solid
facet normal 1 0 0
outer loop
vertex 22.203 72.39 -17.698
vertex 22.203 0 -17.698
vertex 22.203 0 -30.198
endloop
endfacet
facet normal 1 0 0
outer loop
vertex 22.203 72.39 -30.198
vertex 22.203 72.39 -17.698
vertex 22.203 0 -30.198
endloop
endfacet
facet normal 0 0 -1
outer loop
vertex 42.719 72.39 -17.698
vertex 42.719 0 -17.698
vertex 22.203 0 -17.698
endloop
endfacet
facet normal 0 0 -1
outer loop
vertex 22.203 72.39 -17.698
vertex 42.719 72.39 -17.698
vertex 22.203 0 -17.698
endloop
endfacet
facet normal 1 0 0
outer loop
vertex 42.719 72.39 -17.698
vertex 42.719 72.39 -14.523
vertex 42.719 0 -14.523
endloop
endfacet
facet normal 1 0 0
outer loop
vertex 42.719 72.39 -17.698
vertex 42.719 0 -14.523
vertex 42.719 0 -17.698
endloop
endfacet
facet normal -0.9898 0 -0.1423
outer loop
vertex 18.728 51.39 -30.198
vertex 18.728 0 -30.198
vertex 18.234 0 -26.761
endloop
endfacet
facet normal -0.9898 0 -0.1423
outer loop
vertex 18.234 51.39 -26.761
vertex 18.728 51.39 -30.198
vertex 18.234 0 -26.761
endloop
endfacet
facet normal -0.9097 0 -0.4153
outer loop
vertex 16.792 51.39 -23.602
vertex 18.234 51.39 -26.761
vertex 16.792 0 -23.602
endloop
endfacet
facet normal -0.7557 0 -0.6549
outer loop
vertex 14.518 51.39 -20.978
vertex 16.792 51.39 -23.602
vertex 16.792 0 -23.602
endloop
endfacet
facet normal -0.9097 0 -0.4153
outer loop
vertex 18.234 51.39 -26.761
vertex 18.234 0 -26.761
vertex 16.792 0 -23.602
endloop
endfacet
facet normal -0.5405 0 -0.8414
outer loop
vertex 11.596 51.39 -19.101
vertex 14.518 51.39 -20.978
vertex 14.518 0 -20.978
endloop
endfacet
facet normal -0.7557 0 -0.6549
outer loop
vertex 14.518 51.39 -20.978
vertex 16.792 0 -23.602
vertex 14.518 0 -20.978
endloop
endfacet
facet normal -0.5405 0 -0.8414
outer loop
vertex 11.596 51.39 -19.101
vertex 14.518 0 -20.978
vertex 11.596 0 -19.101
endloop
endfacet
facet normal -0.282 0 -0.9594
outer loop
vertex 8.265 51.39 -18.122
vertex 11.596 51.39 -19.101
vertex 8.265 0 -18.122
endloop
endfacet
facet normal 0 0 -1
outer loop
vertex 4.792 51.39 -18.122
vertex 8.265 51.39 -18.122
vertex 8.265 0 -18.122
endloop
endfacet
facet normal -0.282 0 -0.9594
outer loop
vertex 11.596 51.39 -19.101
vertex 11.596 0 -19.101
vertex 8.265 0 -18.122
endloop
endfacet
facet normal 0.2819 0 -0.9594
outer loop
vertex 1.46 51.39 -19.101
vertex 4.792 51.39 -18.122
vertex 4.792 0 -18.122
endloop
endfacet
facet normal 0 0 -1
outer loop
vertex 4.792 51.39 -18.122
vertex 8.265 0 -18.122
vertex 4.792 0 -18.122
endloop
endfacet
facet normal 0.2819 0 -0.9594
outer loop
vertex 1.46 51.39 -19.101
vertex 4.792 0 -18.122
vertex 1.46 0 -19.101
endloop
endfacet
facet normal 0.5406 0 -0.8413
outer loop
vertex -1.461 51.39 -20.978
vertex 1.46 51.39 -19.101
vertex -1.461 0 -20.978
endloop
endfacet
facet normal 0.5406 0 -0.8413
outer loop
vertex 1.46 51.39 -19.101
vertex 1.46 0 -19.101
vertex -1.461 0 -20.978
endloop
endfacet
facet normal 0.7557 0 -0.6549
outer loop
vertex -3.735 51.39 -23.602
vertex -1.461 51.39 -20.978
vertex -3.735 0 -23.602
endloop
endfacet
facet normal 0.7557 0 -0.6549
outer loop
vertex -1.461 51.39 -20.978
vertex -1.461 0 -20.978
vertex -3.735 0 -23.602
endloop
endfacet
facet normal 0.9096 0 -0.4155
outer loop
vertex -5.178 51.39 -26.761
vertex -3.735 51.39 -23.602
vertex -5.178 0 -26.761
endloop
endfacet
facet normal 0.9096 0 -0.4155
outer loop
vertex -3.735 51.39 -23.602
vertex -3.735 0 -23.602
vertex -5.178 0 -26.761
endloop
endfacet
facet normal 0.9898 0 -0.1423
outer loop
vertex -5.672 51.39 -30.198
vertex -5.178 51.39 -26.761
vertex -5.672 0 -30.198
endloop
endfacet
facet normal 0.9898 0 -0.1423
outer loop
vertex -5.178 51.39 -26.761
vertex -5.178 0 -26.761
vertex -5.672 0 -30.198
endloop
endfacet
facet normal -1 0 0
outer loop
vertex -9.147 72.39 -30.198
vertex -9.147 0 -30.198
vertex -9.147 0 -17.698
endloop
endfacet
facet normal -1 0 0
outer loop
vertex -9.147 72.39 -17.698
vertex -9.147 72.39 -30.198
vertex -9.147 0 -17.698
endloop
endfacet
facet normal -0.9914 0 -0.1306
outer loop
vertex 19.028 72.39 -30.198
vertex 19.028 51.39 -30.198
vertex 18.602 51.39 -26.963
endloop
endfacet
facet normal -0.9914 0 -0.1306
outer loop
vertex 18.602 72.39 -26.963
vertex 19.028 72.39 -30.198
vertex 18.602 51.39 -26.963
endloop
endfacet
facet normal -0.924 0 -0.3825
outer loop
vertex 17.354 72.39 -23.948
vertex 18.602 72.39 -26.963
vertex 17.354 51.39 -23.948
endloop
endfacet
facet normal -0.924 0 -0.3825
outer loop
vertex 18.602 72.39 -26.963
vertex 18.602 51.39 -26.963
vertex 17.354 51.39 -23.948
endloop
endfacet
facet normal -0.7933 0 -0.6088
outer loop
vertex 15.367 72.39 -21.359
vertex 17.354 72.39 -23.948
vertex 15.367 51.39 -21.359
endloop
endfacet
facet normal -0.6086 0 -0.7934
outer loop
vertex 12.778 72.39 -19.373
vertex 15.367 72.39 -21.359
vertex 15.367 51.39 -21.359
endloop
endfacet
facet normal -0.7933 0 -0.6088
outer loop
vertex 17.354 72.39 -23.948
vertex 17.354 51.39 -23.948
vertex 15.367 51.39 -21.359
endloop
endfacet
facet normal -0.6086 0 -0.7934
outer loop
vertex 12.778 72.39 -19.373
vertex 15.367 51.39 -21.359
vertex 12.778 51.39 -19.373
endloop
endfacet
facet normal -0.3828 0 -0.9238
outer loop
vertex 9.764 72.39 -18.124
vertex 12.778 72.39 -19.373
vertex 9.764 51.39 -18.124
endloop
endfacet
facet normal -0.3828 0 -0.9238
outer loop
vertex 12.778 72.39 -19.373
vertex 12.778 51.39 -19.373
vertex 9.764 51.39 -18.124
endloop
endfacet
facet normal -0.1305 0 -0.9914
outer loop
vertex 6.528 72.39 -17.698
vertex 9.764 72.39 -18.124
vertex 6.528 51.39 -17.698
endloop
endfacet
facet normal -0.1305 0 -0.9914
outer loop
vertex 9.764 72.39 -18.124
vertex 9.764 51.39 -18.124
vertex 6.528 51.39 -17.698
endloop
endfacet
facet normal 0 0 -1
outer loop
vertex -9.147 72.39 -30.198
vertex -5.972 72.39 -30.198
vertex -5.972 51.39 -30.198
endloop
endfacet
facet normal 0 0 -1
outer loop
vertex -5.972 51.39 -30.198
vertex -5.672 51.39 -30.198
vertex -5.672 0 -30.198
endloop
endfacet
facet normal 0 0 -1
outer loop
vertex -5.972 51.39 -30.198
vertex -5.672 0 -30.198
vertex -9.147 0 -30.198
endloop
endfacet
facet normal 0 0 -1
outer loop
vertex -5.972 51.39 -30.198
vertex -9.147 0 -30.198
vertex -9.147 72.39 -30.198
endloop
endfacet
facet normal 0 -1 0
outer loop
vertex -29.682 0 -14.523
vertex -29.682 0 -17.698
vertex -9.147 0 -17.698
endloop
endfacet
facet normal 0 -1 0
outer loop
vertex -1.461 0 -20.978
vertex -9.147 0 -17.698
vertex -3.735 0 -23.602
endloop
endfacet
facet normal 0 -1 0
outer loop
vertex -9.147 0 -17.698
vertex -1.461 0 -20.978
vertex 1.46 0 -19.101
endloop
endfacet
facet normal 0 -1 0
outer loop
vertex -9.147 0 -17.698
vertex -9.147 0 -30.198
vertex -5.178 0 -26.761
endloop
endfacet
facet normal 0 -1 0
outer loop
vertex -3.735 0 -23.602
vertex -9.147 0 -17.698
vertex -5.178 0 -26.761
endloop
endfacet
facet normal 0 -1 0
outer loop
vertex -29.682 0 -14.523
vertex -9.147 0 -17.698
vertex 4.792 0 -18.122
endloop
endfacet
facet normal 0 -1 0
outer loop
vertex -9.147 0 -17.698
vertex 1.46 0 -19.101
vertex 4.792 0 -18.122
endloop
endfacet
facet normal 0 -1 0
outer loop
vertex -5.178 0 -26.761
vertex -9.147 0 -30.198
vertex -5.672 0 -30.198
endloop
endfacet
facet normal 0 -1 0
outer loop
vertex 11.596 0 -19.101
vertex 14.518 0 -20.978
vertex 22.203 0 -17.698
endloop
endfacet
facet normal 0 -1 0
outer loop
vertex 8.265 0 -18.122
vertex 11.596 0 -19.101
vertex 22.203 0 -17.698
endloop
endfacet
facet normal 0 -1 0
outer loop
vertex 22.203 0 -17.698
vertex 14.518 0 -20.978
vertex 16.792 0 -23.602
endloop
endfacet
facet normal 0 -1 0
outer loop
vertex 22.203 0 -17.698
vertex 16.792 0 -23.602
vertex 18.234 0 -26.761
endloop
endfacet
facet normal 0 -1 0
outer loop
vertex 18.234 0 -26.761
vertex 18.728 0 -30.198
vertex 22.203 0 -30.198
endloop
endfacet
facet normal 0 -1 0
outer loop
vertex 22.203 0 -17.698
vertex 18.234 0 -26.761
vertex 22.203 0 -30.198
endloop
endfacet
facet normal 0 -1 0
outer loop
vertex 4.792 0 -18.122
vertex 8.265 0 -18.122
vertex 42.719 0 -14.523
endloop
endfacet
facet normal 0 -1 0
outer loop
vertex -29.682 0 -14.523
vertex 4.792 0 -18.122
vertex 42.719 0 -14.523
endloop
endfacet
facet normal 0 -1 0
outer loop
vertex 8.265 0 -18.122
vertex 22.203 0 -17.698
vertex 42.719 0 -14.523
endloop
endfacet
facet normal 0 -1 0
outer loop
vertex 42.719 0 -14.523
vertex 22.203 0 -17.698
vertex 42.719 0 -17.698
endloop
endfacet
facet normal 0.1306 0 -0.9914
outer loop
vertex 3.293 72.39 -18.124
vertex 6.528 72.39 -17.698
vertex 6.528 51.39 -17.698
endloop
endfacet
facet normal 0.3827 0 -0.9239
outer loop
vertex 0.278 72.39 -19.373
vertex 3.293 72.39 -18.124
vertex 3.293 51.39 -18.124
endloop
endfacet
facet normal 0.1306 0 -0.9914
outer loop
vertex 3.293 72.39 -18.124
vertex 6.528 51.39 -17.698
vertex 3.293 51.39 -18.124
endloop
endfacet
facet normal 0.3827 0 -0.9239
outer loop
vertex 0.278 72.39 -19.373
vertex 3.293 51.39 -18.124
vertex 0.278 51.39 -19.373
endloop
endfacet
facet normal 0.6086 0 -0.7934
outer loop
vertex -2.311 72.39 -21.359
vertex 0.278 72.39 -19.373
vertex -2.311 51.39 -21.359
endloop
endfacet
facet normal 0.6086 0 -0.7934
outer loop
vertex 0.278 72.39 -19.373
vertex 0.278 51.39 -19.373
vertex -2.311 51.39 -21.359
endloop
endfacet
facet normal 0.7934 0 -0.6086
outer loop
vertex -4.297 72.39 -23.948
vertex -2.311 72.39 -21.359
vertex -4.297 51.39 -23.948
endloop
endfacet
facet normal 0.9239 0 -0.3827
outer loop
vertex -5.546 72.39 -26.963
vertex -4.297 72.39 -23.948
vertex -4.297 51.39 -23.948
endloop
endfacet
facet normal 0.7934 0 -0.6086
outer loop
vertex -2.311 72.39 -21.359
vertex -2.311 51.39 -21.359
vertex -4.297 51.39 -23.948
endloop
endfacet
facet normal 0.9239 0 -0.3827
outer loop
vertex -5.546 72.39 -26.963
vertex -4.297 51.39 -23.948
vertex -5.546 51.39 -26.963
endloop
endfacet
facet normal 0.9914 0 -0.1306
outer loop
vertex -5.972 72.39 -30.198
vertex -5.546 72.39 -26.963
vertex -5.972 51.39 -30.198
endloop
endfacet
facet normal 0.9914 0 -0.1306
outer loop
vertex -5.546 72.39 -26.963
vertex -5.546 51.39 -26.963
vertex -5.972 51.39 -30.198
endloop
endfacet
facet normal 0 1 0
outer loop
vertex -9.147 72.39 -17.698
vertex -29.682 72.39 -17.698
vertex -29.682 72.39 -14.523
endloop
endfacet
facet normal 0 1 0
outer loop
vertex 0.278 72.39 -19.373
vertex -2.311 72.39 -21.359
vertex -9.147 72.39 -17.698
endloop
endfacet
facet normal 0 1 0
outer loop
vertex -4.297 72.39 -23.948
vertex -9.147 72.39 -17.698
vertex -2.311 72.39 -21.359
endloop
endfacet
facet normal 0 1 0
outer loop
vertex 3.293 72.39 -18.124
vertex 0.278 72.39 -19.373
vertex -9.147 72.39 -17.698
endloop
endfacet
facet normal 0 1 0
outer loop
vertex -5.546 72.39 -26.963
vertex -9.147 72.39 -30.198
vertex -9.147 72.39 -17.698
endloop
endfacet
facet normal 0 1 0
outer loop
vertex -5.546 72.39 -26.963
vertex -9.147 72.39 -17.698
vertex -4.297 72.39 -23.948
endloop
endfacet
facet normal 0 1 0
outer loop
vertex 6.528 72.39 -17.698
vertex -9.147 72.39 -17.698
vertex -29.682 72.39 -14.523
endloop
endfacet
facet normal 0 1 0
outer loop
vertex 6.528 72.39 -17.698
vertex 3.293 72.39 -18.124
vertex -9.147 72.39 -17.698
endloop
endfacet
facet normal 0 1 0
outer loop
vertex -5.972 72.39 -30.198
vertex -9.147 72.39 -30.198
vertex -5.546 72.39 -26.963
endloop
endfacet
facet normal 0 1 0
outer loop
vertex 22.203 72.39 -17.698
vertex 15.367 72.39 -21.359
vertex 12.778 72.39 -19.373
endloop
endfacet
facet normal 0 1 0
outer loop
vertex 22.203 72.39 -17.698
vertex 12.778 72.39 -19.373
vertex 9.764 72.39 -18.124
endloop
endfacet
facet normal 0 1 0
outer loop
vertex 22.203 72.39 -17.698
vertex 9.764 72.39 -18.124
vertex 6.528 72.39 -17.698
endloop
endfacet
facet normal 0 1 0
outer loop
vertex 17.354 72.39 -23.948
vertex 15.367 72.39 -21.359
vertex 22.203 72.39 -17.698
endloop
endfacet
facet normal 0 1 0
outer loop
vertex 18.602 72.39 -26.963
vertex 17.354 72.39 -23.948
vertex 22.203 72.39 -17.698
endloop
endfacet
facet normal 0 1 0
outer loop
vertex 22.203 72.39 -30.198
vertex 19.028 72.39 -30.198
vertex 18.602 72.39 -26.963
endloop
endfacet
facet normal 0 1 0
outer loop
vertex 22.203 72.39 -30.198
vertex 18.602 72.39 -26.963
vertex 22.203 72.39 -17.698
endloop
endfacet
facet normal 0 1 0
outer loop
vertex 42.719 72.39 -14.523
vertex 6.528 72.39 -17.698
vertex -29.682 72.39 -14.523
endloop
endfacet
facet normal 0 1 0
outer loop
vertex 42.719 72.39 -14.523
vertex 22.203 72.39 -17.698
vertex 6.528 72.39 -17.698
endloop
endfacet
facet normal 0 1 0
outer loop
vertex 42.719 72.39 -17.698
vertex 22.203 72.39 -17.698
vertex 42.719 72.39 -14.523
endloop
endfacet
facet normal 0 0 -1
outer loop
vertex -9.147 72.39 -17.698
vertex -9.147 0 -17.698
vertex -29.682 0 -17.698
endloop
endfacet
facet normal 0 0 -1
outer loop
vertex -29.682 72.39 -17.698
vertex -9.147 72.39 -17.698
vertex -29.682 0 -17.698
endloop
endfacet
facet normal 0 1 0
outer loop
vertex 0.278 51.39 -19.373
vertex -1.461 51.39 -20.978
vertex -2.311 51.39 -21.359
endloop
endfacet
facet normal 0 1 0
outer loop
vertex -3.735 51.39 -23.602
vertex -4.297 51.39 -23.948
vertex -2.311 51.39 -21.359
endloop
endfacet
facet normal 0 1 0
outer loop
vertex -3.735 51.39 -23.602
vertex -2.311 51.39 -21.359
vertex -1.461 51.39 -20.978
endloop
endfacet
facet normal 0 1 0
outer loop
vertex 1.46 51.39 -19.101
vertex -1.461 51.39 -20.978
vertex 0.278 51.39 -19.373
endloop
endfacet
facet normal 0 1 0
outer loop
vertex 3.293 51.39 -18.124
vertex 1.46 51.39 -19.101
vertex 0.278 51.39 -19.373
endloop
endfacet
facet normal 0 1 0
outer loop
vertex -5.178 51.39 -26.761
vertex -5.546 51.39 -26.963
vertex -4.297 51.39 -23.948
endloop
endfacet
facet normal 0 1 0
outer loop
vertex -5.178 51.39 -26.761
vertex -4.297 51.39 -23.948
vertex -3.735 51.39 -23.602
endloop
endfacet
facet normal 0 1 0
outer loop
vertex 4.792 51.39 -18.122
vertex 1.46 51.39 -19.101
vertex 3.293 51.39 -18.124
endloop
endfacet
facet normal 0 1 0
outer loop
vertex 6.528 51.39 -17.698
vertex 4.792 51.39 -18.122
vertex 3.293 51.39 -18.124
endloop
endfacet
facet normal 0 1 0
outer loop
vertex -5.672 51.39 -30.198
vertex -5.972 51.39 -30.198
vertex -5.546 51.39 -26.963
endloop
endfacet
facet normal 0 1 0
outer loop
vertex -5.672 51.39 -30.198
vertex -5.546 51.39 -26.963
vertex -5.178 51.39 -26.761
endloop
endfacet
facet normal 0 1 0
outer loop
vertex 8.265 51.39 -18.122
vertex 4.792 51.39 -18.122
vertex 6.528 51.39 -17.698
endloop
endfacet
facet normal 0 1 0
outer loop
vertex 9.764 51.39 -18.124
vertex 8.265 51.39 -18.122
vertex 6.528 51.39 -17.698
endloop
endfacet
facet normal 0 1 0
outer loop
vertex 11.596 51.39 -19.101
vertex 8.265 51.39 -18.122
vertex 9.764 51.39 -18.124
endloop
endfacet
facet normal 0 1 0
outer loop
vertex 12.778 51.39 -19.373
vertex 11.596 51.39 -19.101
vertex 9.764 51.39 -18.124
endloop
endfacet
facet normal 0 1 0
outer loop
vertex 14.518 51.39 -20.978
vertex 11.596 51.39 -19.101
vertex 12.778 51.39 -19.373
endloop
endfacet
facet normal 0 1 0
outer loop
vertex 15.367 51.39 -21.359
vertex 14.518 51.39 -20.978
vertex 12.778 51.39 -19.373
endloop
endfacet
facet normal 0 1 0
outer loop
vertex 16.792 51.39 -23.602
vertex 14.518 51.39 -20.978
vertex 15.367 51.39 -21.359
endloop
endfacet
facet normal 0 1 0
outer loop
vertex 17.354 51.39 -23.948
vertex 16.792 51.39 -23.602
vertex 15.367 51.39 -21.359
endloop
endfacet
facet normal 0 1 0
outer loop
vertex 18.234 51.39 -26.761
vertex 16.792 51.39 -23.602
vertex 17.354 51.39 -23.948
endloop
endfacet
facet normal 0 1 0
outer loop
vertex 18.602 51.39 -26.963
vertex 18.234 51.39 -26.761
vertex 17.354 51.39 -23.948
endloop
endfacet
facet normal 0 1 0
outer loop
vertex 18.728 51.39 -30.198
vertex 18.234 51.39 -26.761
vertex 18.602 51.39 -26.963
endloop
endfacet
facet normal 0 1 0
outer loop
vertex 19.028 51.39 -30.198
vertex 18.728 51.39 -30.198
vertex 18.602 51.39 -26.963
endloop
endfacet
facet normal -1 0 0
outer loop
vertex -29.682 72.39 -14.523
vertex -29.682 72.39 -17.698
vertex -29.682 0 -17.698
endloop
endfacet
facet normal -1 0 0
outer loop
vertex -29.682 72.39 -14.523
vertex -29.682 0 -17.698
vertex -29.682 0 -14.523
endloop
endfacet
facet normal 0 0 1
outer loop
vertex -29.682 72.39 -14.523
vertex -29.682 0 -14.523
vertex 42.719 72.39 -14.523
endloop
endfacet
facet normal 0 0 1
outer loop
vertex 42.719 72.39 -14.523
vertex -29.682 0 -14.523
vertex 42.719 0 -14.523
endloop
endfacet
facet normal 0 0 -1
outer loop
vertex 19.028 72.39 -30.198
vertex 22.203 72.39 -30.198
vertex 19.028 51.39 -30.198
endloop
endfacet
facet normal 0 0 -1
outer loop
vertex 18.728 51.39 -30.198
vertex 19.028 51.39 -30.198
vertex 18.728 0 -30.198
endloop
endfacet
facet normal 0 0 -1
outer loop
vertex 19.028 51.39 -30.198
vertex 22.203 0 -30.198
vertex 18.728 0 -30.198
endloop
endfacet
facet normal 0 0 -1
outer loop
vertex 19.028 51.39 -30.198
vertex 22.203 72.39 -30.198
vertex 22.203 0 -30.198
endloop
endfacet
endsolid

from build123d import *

# Parameters (mm, degrees)
BOSS_EXTRUDE4_DEPTH = 51.39
BOSS_EXTRUDE5_DEPTH = 72.39


with BuildPart() as part:
    # Sketch1 → Boss-Extrude4 (new body)
    with BuildSketch(Plane(origin=(0, 0, 0), x_dir=(1, 0, 0), z_dir=(0, 1, 0))):
        with BuildLine():
            ThreePointArc((18.7283116, 30.198170271), (6.5283116, 17.99817027), (-5.6716884, 30.198170271))
            Line((-5.6716884, 30.198170271), (-9.146688396, 30.198170271))
            Line((-9.146688396, 30.198170271), (-9.146688396, 17.698170271))
            Line((-9.146688396, 17.698170271), (-29.681604426, 17.698170271))
            Line((-29.681604426, 17.698170271), (-29.681604426, 14.523170271))
            Line((-29.681604426, 14.523170271), (42.719057074, 14.523170271))
            Line((42.719057074, 14.523170271), (42.719057074, 17.698170271))
            Line((42.719057074, 17.698170271), (22.203311604, 17.698170271))
            Line((22.203311604, 17.698170271), (22.203311604, 30.198170271))
            Line((22.203311604, 30.198170271), (18.7283116, 30.198170271))
        make_face()
    extrude(amount=BOSS_EXTRUDE4_DEPTH)

    # Sketch1<9> → Boss-Extrude5 (add)
    with BuildSketch(Plane(origin=(0, 0, 0), x_dir=(1, 0, 0), z_dir=(0, 1, 0))):
        with BuildLine():
            Line((-5.971688396, 30.198170271), (-9.146688396, 30.198170271))
            Line((-9.146688396, 30.198170271), (-9.146688396, 17.698170271))
            Line((-9.146688396, 17.698170271), (-29.681604426, 17.698170271))
            Line((-29.681604426, 17.698170271), (-29.681604426, 14.523170271))
            Line((-29.681604426, 14.523170271), (42.719057074, 14.523170271))
            Line((42.719057074, 14.523170271), (42.719057074, 17.698170271))
            Line((42.719057074, 17.698170271), (22.203311604, 17.698170271))
            Line((22.203311604, 17.698170271), (22.203311604, 30.198170271))
            Line((22.203311604, 30.198170271), (19.028311604, 30.198170271))
            ThreePointArc((19.028311604, 30.198170271), (6.528311604, 17.698170271), (-5.971688396, 30.198170271))
        make_face()
    extrude(amount=BOSS_EXTRUDE5_DEPTH)


solid = part.part
